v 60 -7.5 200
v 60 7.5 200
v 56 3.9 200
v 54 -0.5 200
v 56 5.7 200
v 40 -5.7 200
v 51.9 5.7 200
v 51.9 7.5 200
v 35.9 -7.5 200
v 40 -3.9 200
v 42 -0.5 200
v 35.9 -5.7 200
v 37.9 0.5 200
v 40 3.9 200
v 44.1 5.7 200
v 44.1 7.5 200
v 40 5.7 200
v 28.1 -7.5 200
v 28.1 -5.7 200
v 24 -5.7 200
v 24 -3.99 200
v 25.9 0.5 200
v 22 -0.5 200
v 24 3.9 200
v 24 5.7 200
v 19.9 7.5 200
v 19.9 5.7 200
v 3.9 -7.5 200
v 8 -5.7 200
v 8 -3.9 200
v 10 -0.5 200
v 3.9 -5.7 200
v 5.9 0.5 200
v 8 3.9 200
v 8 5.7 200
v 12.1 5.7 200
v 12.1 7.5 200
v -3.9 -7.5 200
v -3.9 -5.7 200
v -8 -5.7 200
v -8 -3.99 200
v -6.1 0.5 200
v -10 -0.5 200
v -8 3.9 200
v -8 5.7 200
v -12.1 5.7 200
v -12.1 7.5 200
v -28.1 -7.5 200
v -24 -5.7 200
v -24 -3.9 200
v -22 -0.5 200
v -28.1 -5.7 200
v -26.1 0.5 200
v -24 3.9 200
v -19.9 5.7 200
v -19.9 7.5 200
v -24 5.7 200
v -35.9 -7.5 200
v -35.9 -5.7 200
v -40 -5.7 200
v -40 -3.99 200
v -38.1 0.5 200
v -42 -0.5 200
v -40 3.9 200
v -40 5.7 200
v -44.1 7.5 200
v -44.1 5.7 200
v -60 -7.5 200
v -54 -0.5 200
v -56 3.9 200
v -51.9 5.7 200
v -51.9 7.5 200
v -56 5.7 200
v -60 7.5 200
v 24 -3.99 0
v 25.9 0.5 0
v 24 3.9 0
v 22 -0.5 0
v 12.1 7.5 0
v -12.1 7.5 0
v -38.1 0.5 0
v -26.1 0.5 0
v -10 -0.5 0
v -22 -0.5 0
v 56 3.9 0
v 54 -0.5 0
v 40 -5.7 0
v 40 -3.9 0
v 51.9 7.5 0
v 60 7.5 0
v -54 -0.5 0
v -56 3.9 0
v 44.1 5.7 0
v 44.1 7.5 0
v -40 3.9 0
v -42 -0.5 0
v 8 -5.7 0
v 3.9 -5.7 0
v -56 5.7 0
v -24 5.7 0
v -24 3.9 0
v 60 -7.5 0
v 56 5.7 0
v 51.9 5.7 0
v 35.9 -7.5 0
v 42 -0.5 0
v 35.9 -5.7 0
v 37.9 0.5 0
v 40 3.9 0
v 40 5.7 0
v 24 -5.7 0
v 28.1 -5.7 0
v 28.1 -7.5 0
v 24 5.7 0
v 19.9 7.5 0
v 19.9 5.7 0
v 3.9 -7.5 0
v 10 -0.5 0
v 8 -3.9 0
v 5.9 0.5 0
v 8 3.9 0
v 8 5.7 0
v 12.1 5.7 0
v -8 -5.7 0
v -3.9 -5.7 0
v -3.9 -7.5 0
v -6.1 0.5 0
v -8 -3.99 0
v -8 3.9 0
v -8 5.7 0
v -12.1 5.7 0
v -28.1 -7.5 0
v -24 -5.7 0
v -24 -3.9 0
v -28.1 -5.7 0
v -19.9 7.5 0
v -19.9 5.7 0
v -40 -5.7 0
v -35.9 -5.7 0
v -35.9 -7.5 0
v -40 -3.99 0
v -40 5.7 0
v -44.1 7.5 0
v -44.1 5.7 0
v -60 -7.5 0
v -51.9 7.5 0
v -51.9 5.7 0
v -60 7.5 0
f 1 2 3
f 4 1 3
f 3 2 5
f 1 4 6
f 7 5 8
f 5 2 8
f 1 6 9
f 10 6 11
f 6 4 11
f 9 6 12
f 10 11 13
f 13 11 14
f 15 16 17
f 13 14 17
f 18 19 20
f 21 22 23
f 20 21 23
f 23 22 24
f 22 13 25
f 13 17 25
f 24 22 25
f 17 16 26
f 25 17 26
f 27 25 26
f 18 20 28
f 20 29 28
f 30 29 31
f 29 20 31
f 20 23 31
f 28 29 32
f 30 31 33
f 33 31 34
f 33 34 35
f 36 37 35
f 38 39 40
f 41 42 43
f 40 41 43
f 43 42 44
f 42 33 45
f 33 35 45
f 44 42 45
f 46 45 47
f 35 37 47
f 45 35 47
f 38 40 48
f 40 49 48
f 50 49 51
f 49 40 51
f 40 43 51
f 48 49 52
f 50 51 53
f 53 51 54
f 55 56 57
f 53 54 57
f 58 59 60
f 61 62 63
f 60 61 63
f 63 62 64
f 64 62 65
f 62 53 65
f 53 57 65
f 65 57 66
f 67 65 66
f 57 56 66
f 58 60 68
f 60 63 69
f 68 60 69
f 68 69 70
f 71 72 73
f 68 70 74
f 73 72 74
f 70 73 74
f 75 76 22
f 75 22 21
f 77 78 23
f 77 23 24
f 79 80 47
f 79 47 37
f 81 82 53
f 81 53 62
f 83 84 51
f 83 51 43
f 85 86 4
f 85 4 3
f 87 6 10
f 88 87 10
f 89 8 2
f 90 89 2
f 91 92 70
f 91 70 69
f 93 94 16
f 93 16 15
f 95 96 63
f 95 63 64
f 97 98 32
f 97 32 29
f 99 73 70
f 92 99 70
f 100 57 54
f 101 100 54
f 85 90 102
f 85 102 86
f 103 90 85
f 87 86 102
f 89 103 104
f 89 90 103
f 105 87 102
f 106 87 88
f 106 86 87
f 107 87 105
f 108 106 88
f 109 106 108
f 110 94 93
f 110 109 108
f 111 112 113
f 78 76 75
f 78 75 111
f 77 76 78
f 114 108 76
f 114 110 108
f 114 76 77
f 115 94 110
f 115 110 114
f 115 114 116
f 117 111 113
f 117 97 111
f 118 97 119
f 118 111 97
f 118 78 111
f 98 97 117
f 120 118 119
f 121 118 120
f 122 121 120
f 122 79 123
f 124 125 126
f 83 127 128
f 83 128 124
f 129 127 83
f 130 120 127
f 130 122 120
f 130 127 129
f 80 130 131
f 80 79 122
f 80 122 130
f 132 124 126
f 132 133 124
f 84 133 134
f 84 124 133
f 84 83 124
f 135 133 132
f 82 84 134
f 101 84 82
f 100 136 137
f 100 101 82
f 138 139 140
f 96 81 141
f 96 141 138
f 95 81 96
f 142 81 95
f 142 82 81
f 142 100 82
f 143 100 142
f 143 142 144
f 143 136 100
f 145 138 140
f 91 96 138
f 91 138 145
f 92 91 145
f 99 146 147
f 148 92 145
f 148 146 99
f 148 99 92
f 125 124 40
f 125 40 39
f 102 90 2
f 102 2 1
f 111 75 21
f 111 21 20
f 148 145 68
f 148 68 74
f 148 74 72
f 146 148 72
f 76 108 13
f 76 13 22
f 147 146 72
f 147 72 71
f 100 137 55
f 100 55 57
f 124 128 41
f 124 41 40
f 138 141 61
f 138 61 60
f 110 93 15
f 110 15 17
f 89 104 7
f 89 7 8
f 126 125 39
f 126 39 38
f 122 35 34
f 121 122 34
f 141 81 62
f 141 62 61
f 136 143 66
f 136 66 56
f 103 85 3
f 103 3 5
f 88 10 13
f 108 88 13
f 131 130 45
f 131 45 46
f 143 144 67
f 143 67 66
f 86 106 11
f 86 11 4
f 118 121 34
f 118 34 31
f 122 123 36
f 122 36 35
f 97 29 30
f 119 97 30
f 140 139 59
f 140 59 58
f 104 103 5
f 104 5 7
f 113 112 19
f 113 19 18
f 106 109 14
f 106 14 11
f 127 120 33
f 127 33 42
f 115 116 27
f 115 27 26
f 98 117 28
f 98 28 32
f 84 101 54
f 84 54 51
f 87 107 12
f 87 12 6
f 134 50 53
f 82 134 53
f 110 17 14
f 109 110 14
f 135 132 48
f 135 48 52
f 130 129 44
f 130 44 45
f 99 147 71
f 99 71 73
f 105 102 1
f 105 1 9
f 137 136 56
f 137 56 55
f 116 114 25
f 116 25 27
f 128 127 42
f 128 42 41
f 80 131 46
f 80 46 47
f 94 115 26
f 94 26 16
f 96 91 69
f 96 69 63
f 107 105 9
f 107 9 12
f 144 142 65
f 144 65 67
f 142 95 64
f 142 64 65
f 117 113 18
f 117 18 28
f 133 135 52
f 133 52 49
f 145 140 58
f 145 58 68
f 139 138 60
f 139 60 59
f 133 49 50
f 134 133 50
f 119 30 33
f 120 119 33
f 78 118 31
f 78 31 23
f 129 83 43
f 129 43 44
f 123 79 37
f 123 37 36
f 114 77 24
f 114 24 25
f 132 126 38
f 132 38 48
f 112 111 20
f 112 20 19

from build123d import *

# Parameters (mm, degrees)
BOSS_EXTRUDE1_DEPTH = 200


with BuildPart() as part:
    # Sketch1 → Boss-Extrude1 (new body)
    with BuildSketch(Plane.XY):
        Polygon((60, -7.5), (35.9, -7.5), (35.9, -5.7), (40, -5.7), (40, -3.9), (37.900227313, 0.5), (25.900227313, 0.5), (24, -3.989786353), (24, -5.7), (28.1, -5.7), (28.1, -7.5), (3.9, -7.5), (3.9, -5.7), (8, -5.7), (8, -3.9), (5.900227313, 0.5), (-6.099772687, 0.5), (-8, -3.989786353), (-8, -5.7), (-3.9, -5.7), (-3.9, -7.5), (-28.1, -7.5), (-28.1, -5.7), (-24, -5.7), (-24, -3.9), (-26.099772687, 0.5), (-38.099772687, 0.5), (-40, -3.989786353), (-40, -5.7), (-35.9, -5.7), (-35.9, -7.5), (-60, -7.5), (-60, 7.5), (-51.9, 7.5), (-51.9, 5.7), (-56, 5.7), (-56, 3.9), (-54, -0.5), (-42, -0.5), (-40, 3.9), (-40, 5.7), (-44.1, 5.7), (-44.1, 7.5), (-19.9, 7.5), (-19.9, 5.7), (-24, 5.7), (-24, 3.9), (-22, -0.5), (-10, -0.5), (-8, 3.9), (-8, 5.7), (-12.1, 5.7), (-12.1, 7.5), (12.1, 7.5), (12.1, 5.7), (8, 5.7), (8, 3.9), (10, -0.5), (22, -0.5), (24, 3.9), (24, 5.7), (19.9, 5.7), (19.9, 7.5), (44.1, 7.5), (44.1, 5.7), (40, 5.7), (40, 3.9), (42, -0.5), (54, -0.5), (56, 3.9), (56, 5.7), (51.9, 5.7), (51.9, 7.5), (60, 7.5), align=None)
    extrude(amount=BOSS_EXTRUDE1_DEPTH)


solid = part.part
